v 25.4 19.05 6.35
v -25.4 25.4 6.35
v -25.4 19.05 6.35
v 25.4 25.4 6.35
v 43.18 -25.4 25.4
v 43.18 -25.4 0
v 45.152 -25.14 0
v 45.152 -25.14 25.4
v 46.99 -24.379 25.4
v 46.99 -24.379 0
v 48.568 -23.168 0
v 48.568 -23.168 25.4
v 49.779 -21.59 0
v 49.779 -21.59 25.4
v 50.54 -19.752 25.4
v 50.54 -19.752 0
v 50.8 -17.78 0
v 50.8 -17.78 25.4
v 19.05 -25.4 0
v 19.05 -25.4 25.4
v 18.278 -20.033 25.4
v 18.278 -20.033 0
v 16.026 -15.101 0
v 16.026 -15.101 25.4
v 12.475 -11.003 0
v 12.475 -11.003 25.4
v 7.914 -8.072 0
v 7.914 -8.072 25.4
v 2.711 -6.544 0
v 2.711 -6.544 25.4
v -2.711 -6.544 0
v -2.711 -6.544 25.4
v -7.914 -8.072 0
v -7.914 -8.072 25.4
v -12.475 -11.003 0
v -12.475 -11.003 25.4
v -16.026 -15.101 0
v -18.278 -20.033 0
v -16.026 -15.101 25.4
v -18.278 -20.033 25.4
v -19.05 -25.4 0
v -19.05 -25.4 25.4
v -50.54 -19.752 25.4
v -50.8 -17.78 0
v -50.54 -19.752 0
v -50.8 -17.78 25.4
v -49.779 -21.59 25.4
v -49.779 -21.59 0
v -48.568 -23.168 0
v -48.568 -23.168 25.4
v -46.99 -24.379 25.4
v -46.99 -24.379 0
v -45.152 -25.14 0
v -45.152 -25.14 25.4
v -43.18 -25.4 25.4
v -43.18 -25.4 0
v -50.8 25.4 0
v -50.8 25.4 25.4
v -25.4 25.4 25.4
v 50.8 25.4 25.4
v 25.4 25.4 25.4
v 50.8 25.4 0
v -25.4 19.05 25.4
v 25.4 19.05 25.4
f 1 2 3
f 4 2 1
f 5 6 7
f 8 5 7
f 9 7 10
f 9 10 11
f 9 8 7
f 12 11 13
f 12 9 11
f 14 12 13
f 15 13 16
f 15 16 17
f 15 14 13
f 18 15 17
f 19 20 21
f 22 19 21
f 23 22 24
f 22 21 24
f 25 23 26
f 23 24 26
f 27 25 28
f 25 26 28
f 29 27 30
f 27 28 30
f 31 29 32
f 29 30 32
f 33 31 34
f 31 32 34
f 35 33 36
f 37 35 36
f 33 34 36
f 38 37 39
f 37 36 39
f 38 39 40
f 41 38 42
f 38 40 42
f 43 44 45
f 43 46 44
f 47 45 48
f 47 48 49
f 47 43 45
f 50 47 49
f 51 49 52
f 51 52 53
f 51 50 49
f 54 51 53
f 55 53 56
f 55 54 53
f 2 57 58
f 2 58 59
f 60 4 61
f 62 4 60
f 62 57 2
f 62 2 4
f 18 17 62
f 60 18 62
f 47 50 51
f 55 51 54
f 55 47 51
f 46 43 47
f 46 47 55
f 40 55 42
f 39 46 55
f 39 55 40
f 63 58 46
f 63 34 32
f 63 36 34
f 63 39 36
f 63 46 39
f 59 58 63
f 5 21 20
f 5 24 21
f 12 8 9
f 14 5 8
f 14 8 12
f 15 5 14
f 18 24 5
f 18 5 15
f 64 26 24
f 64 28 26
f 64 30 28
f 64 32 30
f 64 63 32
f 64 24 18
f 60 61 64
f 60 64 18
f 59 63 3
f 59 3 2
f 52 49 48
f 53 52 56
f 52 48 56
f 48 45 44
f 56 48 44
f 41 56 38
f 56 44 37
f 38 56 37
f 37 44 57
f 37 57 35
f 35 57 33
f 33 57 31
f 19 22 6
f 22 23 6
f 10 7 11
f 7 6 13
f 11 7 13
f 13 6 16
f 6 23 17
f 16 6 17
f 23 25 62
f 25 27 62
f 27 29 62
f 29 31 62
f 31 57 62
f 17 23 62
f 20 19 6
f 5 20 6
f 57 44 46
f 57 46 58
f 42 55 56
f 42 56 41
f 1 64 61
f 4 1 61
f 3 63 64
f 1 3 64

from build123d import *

# Parameters (mm, degrees)
F0_W     = 101.6
F0_H     = 50.8
F1_DEPTH = 25.4
F2_R     = 7.62
F3_W     = 50.8
F3_H     = 6.35
F4_DEPTH = 19.05
F5_R     = 19.05
F6_DEPTH = 25.4


with BuildPart() as f1:
    # F0 (on Top) → F1 (new body)
    with BuildSketch(Plane.XY):
        Rectangle(F0_W, F0_H)
    extrude(amount=F1_DEPTH)

    # F2
    f2_edges = [f1.edges().sort_by_distance(p)[0] for p in [
        (-50.8, -25.4, 12.7),
        (50.8, -25.4, 12.7),
    ]]
    fillet(f2_edges, radius=F2_R)

    # F3 (on face) → F4 (cut)
    with BuildSketch(Plane.XY.offset(25.4)):
        with Locations((0, 22.225)):
            Rectangle(F3_W, F3_H)
    extrude(amount=-F4_DEPTH, mode=Mode.SUBTRACT)

    # F5 (on face) → F6 (cut)
    with BuildSketch(Plane.XY.offset(25.4)):
        with Locations((0, -25.4)):
            Circle(F5_R)
    extrude(amount=-F6_DEPTH, mode=Mode.SUBTRACT)


solid = f1.part
